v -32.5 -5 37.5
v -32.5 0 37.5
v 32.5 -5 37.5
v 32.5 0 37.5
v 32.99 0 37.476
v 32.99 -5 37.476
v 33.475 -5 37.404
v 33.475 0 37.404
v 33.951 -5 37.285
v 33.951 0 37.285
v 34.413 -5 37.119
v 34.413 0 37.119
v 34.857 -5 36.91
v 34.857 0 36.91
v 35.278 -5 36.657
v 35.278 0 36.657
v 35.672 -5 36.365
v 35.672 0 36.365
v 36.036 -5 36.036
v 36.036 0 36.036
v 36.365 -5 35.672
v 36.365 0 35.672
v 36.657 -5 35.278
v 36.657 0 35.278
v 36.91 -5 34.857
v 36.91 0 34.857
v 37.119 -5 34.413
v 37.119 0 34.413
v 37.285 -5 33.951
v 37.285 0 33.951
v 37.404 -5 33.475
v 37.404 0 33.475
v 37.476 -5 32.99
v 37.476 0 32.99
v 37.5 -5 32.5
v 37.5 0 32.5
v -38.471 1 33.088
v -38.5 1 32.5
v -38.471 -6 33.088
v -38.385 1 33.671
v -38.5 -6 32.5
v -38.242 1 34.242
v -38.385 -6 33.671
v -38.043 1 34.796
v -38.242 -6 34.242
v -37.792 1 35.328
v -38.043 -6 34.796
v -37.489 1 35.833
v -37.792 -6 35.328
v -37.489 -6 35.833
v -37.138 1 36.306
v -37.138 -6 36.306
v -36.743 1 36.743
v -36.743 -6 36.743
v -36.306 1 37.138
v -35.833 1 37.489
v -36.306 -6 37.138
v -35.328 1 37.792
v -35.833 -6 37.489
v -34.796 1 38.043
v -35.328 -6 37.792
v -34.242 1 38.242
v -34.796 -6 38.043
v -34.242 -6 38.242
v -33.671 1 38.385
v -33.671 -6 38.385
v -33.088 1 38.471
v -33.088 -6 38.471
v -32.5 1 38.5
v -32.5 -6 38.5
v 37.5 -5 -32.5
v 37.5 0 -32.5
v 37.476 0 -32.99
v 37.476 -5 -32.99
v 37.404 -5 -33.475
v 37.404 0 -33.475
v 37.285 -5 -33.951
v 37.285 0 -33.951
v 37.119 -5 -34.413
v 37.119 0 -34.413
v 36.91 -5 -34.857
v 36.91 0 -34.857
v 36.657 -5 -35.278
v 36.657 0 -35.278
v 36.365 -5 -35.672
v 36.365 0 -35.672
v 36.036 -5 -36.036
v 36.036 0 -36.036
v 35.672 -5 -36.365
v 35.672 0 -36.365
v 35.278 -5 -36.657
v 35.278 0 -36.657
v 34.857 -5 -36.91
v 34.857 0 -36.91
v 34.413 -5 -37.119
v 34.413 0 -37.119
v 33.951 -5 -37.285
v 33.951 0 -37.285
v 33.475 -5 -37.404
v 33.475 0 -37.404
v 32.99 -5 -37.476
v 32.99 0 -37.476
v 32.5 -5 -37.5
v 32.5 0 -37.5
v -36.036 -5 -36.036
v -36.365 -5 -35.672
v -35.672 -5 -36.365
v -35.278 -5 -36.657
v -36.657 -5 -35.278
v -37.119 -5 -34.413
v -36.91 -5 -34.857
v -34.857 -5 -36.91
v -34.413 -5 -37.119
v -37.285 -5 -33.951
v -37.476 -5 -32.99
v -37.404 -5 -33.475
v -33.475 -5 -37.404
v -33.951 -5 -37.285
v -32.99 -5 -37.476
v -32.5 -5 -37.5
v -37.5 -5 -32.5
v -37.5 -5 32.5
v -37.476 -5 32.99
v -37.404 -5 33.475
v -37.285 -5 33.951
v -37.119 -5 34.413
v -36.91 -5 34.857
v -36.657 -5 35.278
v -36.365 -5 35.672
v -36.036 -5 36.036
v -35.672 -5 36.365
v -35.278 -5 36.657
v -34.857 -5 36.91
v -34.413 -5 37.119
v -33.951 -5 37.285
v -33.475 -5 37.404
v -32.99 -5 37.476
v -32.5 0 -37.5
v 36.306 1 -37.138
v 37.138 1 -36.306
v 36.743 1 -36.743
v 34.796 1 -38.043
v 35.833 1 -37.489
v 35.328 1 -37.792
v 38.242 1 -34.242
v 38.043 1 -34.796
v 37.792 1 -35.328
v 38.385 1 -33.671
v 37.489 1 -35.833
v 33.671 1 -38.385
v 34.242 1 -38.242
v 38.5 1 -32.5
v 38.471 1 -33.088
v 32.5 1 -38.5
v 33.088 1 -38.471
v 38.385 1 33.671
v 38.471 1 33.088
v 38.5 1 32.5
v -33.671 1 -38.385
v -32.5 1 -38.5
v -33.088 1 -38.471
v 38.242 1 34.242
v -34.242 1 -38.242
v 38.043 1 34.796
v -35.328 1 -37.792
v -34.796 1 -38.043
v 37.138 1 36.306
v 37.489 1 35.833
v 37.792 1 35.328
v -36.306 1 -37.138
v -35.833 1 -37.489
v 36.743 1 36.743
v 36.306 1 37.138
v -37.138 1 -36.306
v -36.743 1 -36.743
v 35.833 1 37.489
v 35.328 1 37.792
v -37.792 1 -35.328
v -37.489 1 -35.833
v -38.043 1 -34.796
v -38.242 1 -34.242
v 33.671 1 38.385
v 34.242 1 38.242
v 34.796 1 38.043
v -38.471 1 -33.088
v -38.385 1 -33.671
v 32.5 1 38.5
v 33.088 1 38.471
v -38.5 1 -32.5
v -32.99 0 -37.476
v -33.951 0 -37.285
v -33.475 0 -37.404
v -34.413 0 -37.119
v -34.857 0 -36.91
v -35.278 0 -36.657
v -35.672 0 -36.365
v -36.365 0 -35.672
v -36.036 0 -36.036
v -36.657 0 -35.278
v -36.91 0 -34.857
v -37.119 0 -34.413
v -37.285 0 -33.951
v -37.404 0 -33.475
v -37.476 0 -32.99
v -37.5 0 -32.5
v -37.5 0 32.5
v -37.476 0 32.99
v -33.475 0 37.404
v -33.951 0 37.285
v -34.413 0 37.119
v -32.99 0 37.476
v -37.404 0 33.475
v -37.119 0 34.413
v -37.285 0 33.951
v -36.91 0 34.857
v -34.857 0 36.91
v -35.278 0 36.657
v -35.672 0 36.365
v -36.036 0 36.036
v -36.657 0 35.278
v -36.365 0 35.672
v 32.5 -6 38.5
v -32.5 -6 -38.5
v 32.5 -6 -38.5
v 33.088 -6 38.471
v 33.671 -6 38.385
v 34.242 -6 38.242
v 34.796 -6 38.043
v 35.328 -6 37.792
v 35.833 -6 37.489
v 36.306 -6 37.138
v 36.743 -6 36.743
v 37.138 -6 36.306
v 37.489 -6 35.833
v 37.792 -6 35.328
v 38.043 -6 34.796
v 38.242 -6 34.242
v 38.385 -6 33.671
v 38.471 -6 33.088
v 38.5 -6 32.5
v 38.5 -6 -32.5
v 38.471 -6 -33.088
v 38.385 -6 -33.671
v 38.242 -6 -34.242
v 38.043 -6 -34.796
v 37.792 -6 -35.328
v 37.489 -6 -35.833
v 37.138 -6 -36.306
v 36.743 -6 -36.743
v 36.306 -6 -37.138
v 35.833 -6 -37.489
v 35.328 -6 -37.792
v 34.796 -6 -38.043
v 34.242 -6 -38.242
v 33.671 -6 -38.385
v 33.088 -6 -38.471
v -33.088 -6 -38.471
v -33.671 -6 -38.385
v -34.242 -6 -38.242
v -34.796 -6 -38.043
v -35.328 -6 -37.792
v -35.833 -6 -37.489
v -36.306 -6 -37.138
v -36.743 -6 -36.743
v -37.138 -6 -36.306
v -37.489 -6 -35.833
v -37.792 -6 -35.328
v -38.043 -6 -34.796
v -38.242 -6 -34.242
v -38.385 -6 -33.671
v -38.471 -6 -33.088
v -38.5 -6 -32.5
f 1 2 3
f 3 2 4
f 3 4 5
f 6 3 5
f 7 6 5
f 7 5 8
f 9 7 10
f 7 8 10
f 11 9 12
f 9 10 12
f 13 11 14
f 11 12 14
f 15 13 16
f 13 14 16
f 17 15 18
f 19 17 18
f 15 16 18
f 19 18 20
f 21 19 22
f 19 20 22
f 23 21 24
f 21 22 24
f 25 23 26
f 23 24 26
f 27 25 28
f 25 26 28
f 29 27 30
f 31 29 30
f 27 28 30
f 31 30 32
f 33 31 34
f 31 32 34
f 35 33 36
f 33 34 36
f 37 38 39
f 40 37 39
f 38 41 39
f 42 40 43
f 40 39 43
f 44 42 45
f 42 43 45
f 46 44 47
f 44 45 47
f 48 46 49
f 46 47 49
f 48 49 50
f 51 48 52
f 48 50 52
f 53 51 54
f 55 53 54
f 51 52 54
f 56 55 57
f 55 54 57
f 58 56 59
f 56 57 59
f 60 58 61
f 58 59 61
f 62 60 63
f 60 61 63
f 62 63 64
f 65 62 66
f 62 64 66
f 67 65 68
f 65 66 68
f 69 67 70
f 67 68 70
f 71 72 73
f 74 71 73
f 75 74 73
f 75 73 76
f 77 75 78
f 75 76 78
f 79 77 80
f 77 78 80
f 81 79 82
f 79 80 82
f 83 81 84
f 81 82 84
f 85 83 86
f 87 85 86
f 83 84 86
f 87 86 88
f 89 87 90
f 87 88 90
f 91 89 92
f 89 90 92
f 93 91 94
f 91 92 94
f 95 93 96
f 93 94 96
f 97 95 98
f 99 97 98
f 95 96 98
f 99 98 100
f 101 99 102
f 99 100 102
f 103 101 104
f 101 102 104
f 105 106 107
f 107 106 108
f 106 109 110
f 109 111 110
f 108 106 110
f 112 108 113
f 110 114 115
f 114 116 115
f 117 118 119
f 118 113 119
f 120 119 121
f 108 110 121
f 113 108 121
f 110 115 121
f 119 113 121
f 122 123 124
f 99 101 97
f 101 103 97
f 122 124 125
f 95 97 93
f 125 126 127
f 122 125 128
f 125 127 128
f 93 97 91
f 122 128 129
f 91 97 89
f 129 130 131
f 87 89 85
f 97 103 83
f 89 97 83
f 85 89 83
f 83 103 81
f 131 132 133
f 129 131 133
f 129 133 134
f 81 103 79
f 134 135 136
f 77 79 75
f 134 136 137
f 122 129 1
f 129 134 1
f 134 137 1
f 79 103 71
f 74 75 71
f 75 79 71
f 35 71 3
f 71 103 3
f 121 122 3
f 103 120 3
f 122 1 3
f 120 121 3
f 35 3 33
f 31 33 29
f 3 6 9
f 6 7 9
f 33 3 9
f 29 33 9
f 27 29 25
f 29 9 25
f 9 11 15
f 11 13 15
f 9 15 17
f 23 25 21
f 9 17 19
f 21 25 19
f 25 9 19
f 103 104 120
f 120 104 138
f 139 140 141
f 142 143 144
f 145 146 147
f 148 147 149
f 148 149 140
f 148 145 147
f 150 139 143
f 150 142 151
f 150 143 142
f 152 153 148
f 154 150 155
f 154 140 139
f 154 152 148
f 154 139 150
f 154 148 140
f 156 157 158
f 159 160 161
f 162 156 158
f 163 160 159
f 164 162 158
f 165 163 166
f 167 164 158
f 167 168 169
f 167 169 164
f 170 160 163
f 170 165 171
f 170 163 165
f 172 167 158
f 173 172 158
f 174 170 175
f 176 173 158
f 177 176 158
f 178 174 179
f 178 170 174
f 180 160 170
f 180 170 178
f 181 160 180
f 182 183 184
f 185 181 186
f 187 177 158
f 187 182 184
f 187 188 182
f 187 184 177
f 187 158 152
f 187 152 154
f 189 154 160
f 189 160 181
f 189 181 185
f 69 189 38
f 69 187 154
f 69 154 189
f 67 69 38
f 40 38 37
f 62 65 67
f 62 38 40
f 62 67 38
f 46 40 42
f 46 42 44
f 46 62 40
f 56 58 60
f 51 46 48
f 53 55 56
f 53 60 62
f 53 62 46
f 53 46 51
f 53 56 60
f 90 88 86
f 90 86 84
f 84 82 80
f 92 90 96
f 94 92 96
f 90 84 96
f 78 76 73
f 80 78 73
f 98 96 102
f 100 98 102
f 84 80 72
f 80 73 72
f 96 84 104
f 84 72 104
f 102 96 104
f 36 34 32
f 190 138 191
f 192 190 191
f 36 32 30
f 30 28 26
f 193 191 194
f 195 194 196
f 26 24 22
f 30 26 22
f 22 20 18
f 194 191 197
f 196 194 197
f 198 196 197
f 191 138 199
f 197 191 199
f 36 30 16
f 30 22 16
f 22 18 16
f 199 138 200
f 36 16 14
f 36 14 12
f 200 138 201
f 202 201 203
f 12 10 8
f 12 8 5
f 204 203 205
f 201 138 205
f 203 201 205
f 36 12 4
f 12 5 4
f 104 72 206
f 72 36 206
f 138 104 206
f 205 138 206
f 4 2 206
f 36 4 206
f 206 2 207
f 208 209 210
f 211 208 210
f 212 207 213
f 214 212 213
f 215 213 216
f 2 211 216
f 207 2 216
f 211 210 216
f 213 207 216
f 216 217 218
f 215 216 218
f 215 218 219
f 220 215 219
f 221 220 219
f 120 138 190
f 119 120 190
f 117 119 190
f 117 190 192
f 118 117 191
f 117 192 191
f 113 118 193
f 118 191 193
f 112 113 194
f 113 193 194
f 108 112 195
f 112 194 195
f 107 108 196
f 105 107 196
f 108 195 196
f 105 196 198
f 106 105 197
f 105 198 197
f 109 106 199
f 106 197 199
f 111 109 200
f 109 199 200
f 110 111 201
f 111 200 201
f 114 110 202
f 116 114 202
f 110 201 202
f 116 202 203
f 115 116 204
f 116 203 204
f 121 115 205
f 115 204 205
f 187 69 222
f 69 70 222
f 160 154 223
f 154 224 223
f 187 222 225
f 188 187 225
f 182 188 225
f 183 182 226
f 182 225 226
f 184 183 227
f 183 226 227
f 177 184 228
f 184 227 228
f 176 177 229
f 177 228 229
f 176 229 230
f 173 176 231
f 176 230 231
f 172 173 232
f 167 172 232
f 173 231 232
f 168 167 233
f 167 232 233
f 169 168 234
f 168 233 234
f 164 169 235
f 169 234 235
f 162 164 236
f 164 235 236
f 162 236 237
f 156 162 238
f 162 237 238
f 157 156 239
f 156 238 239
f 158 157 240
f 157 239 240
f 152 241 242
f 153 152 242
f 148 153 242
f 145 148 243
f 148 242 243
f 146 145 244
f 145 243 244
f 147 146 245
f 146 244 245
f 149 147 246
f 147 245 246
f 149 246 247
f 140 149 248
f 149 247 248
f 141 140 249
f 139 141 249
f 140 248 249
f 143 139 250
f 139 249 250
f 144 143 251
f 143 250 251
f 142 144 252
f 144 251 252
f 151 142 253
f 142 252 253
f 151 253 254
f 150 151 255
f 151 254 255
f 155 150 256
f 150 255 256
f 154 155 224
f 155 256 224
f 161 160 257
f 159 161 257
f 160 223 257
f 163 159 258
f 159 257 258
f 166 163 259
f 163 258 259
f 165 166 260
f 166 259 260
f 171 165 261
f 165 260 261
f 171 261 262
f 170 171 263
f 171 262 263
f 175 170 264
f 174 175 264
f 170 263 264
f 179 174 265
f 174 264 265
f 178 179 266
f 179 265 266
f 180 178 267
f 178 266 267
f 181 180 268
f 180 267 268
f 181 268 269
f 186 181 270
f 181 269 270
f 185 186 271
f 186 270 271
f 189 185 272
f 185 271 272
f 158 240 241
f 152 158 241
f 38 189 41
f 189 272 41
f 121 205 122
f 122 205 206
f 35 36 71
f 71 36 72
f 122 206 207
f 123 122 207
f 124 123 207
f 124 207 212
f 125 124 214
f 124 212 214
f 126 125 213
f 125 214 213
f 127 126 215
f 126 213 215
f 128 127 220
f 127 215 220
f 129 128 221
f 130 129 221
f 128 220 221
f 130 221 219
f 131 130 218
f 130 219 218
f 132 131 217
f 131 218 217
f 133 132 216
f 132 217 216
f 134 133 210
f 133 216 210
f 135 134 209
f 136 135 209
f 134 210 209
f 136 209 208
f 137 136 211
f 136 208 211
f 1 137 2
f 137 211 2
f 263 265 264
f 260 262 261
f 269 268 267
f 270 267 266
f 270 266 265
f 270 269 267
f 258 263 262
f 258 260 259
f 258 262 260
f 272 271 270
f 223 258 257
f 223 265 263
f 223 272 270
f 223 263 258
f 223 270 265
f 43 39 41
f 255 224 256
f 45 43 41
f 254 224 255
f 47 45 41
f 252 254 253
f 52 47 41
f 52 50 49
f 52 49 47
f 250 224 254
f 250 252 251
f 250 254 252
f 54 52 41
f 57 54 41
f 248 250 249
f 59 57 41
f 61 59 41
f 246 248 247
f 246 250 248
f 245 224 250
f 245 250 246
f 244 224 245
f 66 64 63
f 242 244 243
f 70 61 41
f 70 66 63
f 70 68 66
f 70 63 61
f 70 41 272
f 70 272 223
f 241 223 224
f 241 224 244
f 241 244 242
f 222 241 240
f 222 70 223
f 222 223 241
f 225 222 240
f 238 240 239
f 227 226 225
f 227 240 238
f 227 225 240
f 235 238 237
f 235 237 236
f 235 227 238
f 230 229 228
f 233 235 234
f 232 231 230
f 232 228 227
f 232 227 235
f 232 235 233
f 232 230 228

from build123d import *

# Parameters (mm, degrees)
F1_DEPTH = 5
F3_DEPTH = 1
F5_DEPTH = 1


with BuildPart() as f1:
    # F0 (on Front) → F1 (new body)
    with BuildSketch(Plane.XZ):
        with BuildLine():
            Line((-32.5, -38.5), (32.5, -38.5))
            ThreePointArc((32.5, -38.5), (36.7426406871, -36.7426406871), (38.5, -32.5))
            Line((38.5, -32.5), (38.5, 32.5))
            ThreePointArc((38.5, 32.5), (36.7426406871, 36.7426406871), (32.5, 38.5))
            Line((32.5, 38.5), (-32.5, 38.5))
            ThreePointArc((-32.5, 38.5), (-36.7426406871, 36.7426406871), (-38.5, 32.5))
            Line((-38.5, 32.5), (-38.5, -32.5))
            ThreePointArc((-38.5, -32.5), (-36.7426406871, -36.7426406871), (-32.5, -38.5))
        make_face()
        with BuildLine():
            ThreePointArc((37.5, -32.5), (36.0355339059, -36.0355339059), (32.5, -37.5))
            Line((32.5, -37.5), (-32.5, -37.5))
            ThreePointArc((-32.5, -37.5), (-36.0355339059, -36.0355339059), (-37.5, -32.5))
            Line((-37.5, -32.5), (-37.5, 32.5))
            ThreePointArc((-37.5, 32.5), (-36.0355339059, 36.0355339059), (-32.5, 37.5))
            Line((-32.5, 37.5), (32.5, 37.5))
            ThreePointArc((32.5, 37.5), (36.0355339059, 36.0355339059), (37.5, 32.5))
            Line((37.5, 32.5), (37.5, -32.5))
        make_face(mode=Mode.SUBTRACT)
    extrude(amount=F1_DEPTH)

    # F2 (on face) → F3 (join)
    with BuildSketch(Plane.XZ.offset(5)):
        with BuildLine():
            ThreePointArc((-38.5, -32.5), (-36.7426406871, -36.7426406871), (-32.5, -38.5))
            Line((-32.5, -38.5), (32.5, -38.5))
            ThreePointArc((32.5, -38.5), (36.7426406871, -36.7426406871), (38.5, -32.5))
            Line((38.5, -32.5), (38.5, 32.5))
            ThreePointArc((38.5, 32.5), (36.7426406871, 36.7426406871), (32.5, 38.5))
            Line((32.5, 38.5), (-32.5, 38.5))
            ThreePointArc((-32.5, 38.5), (-36.7426406871, 36.7426406871), (-38.5, 32.5))
            Line((-38.5, 32.5), (-38.5, -32.5))
        make_face()
        with BuildLine():
            Line((37.5, 32.5), (37.5, -32.5))
            ThreePointArc((37.5, -32.5), (36.0355339059, -36.0355339059), (32.5, -37.5))
            Line((32.5, -37.5), (-32.5, -37.5))
            ThreePointArc((-32.5, -37.5), (-36.0355339059, -36.0355339059), (-37.5, -32.5))
            Line((-37.5, -32.5), (-37.5, 32.5))
            ThreePointArc((-37.5, 32.5), (-36.0355339059, 36.0355339059), (-32.5, 37.5))
            Line((-32.5, 37.5), (32.5, 37.5))
            ThreePointArc((32.5, 37.5), (36.0355339059, 36.0355339059), (37.5, 32.5))
        make_face(mode=Mode.SUBTRACT)
        with BuildLine():
            ThreePointArc((32.5, -37.5), (36.0355339059, -36.0355339059), (37.5, -32.5))
            Line((37.5, -32.5), (37.5, 32.5))
            ThreePointArc((37.5, 32.5), (36.0355339059, 36.0355339059), (32.5, 37.5))
            Line((32.5, 37.5), (-32.5, 37.5))
            ThreePointArc((-32.5, 37.5), (-36.0355339059, 36.0355339059), (-37.5, 32.5))
            Line((-37.5, 32.5), (-37.5, -32.5))
            ThreePointArc((-37.5, -32.5), (-36.0355339059, -36.0355339059), (-32.5, -37.5))
            Line((-32.5, -37.5), (32.5, -37.5))
        make_face()
    extrude(amount=F3_DEPTH)

    # F4 (on face) → F5 (join)
    with BuildSketch(Plane(origin=(0, 0, 0), x_dir=(-1, 0, 0), z_dir=(0, 1, 0))):
        with BuildLine():
            ThreePointArc((-38.5, -32.5), (-36.7426406871, -36.7426406871), (-32.5, -38.5))
            Line((-32.5, -38.5), (32.5, -38.5))
            ThreePointArc((32.5, -38.5), (36.7426406871, -36.7426406871), (38.5, -32.5))
            Line((38.5, -32.5), (38.5, 32.5))
            ThreePointArc((38.5, 32.5), (36.7426406871, 36.7426406871), (32.5, 38.5))
            Line((32.5, 38.5), (-32.5, 38.5))
            ThreePointArc((-32.5, 38.5), (-36.7426406871, 36.7426406871), (-38.5, 32.5))
            Line((-38.5, 32.5), (-38.5, -32.5))
        make_face()
        with BuildLine():
            Line((32.5, -37.5), (-32.5, -37.5))
            ThreePointArc((-32.5, -37.5), (-36.0355339059, -36.0355339059), (-37.5, -32.5))
            Line((-37.5, -32.5), (-37.5, 32.5))
            ThreePointArc((-37.5, 32.5), (-36.0355339059, 36.0355339059), (-32.5, 37.5))
            Line((-32.5, 37.5), (32.5, 37.5))
            ThreePointArc((32.5, 37.5), (36.0355339059, 36.0355339059), (37.5, 32.5))
            Line((37.5, 32.5), (37.5, -32.5))
            ThreePointArc((37.5, -32.5), (36.0355339059, -36.0355339059), (32.5, -37.5))
        make_face(mode=Mode.SUBTRACT)
        with BuildLine():
            ThreePointArc((-37.5, -32.5), (-36.0355339059, -36.0355339059), (-32.5, -37.5))
            Line((-32.5, -37.5), (32.5, -37.5))
            ThreePointArc((32.5, -37.5), (36.0355339059, -36.0355339059), (37.5, -32.5))
            Line((37.5, -32.5), (37.5, 32.5))
            ThreePointArc((37.5, 32.5), (36.0355339059, 36.0355339059), (32.5, 37.5))
            Line((32.5, 37.5), (-32.5, 37.5))
            ThreePointArc((-32.5, 37.5), (-36.0355339059, 36.0355339059), (-37.5, 32.5))
            Line((-37.5, 32.5), (-37.5, -32.5))
        make_face()
    extrude(amount=F5_DEPTH)


solid = f1.part
